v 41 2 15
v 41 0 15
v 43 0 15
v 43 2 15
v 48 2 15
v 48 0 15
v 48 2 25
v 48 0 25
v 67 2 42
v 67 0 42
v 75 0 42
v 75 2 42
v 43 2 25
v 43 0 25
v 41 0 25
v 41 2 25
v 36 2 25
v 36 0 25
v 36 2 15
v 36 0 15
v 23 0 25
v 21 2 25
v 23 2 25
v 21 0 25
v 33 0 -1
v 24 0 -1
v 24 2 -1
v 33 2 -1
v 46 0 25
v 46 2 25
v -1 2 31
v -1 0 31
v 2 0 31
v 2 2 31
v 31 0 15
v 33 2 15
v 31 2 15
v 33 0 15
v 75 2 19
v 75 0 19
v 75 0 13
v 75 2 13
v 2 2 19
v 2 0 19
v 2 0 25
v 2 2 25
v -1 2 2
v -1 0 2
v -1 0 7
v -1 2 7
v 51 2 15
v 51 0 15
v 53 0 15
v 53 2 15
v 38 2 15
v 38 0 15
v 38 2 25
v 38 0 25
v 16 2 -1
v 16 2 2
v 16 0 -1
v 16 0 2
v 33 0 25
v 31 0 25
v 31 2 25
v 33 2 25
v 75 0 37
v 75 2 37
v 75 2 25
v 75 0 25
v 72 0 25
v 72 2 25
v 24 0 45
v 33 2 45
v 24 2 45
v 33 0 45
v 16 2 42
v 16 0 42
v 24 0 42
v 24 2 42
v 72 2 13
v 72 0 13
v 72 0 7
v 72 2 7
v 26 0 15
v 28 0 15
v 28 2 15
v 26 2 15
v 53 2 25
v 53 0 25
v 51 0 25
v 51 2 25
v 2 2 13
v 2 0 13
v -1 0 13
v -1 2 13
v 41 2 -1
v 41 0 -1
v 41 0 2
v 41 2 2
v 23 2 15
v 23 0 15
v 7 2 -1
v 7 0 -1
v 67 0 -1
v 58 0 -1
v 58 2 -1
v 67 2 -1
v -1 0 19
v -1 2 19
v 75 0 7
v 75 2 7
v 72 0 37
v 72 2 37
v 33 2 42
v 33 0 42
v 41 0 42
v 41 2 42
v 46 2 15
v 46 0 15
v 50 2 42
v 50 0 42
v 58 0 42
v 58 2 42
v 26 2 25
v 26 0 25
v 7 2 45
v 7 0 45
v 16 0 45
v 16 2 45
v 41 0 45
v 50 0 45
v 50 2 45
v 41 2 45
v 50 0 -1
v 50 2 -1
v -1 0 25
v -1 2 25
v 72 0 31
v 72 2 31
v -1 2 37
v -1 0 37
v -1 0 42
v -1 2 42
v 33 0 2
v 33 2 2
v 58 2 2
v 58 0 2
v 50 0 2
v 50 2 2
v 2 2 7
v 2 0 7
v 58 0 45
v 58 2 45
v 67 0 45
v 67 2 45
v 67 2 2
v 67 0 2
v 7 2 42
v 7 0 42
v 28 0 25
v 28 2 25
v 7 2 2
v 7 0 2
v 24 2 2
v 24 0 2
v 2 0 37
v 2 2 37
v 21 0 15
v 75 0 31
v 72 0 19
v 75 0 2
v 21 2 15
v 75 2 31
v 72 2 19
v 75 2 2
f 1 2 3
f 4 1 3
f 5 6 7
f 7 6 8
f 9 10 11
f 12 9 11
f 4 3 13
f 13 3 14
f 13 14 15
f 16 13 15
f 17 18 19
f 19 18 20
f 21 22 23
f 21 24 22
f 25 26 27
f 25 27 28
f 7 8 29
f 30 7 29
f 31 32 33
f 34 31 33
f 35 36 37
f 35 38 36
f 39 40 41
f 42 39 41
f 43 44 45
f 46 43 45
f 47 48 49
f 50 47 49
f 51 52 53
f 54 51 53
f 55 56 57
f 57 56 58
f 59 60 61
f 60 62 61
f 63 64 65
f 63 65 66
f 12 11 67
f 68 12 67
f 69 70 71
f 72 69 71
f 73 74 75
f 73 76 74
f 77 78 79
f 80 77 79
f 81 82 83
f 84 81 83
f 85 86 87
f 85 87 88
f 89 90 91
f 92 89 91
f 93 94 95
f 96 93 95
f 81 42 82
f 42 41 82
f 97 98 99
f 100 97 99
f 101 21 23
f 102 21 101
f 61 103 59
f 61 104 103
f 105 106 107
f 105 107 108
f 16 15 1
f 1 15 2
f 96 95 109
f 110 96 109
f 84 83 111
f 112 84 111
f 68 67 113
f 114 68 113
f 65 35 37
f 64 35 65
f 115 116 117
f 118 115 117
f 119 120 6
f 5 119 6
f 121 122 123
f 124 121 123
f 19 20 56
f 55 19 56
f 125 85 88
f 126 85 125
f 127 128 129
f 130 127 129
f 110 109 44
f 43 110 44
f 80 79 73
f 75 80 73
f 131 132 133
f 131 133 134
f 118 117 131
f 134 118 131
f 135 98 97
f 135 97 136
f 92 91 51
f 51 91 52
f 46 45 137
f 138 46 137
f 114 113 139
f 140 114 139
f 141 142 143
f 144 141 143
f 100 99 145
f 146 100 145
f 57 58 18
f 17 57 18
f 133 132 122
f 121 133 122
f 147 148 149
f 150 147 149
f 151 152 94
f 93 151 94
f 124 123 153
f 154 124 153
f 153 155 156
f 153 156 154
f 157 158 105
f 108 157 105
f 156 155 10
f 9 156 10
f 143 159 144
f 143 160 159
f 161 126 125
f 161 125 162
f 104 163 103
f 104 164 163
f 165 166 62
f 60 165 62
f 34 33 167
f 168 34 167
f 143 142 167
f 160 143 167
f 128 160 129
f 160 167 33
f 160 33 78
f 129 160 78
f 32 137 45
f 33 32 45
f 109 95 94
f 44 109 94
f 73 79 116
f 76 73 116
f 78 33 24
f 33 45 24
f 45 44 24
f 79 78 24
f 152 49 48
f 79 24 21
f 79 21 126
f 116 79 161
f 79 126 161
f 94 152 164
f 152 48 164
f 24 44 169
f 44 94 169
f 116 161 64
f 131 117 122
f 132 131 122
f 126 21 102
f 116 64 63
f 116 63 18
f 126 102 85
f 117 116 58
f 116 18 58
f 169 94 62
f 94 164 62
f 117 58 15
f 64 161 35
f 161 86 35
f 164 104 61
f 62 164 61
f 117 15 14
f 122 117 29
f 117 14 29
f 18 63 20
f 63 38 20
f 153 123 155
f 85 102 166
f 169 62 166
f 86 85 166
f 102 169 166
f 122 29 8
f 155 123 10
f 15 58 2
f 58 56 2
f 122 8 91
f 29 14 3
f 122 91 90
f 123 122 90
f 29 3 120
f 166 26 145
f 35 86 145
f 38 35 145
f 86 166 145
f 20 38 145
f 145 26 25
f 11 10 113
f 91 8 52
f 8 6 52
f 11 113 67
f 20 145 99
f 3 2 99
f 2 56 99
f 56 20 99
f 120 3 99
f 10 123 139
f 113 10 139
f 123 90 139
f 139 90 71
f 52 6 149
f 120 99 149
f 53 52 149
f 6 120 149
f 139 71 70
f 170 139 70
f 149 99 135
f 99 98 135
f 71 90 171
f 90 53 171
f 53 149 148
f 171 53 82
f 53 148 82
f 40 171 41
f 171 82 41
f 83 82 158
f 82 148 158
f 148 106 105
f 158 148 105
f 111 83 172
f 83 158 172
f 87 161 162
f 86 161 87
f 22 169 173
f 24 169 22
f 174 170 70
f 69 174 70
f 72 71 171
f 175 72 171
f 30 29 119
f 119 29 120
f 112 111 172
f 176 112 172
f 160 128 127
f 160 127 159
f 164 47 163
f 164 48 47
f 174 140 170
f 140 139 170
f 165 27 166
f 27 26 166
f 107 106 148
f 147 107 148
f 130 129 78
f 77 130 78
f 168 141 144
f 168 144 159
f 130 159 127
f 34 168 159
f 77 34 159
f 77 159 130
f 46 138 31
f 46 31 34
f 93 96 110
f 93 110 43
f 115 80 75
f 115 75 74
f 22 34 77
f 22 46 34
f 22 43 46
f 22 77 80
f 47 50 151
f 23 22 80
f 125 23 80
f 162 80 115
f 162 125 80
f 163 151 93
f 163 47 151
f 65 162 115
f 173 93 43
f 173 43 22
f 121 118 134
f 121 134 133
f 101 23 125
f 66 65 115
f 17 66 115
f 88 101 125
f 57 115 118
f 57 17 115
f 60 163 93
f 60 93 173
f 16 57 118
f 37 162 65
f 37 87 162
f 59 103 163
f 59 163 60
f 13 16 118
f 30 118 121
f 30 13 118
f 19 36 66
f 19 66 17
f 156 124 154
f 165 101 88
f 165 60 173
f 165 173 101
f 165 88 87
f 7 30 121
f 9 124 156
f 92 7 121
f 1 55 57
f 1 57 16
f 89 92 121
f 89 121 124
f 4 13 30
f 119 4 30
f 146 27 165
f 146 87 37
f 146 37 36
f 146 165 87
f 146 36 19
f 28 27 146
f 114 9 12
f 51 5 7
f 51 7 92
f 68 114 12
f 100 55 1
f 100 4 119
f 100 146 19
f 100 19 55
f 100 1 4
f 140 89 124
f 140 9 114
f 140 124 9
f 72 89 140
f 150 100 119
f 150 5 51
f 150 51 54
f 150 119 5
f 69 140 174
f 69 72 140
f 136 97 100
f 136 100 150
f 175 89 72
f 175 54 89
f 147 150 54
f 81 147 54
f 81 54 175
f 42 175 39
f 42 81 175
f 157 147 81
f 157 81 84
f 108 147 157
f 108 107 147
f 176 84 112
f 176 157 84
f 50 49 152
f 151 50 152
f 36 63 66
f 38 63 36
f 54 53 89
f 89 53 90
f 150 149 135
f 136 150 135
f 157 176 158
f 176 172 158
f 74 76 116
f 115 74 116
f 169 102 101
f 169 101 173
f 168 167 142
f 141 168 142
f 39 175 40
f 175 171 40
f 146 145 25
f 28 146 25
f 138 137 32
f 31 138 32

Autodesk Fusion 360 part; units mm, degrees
sketch "スケッチ1" plane through (0, 0, 0) normal (0, 1, 0) x (1, 0, 0)
  line L0 (0, 0) -> (74, 0)
  line L1 (74, 0) -> (74, -44)
  line L2 (74, -44) -> (0, -44)
  line L3 (0, -44) -> (0, 0)
  dimension "d1" = 74
  dimension "d2" = 44
extrude "押し出し1" add sketch "スケッチ1" along normal blind 2
sketch "スケッチ2" plane through (0, 0, 0) normal (0, -1, 0) x (1, 0, 0)
  line L0 (74, 44) -> (0, 44)
  line L1 (0, 44) -> (0, 0)
  line L2 (0, 0) -> (74, 0)
  line L3 (74, 0) -> (74, 44)
  line L4 (0, 44) -> (7, 44)
  line L5 (7, 44) -> (7, 42)
  line L6 (7, 42) -> (0, 42)
  line L7 (0, 42) -> (0, 44)
  line L8 (16, 42) -> (24, 42)
  line L9 (24, 42) -> (24, 44)
  line L10 (24, 44) -> (16, 44)
  line L11 (16, 44) -> (16, 42)
  line L12 (41, 44) -> (33, 44)
  line L13 (33, 42) -> (41, 42)
  line L14 (41, 42) -> (41, 44)
  line L15 (33, 44) -> (33, 42)
  line L16 (58, 44) -> (50, 44)
  line L17 (50, 42) -> (58, 42)
  line L18 (58, 42) -> (58, 44)
  line L19 (50, 44) -> (50, 42)
  line L20 (67, 42) -> (74, 42)
  line L21 (74, 42) -> (74, 44)
  line L22 (74, 44) -> (67, 44)
  line L23 (67, 44) -> (67, 42)
  line L24 (50, 2) -> (50, 0)
  line L25 (67, 2) -> (67, 0)
  line L26 (16, 0) -> (24, 0)
  line L27 (50, 0) -> (58, 0)
  line L28 (0, 2) -> (7, 2)
  line L29 (67, 0) -> (74, 0)
  line L30 (58, 0) -> (58, 2)
  line L31 (24, 2) -> (16, 2)
  line L32 (33, 2) -> (33, 0)
  line L33 (58, 2) -> (50, 2)
  line L34 (33, 0) -> (41, 0)
  line L35 (0, 0) -> (0, 2)
  line L36 (24, 0) -> (24, 2)
  line L37 (74, 2) -> (67, 2)
  line L38 (7, 2) -> (7, 0)
  line L39 (41, 0) -> (41, 2)
  line L40 (16, 2) -> (16, 0)
  line L41 (74, 0) -> (74, 2)
  line L42 (7, 0) -> (0, 0)
  line L43 (41, 2) -> (33, 2)
  dimension "d5" = 7
  dimension "d6" = 2
  dimension "d7" = 2
  dimension "d8" = 8
  dimension "d9" = 9
  dimension "d12" = 17
  dimension "d13" = 0
  dimension "d14" = 7
  dimension "d15" = 2
  dimension "d16" = 9
extrude "押し出し2" cut sketch "スケッチ2" against normal blind 2 contours L0 L3 L20 L21 L22 L23 | L0 L16 L17 L18 L19 | L2 L3 L25 L29 L37 L41 | L0 L12 L13 L14 L15 | L2 L24 L27 L30 L33 | L0 L8 L9 L10 L11 | L2 L32 L34 L39 L43 | L0 L1 L4 L5 L6 L7 | L2 L26 L31 L36 L40 | L1 L2 L28 L35 L38 L42
sketch "スケッチ3" plane through (0, 0, 0) normal (0, -1, 0) x (1, 0, 0)
  line L0 (33, 42) -> (33, 44)
  line L1 (33, 44) -> (24, 44)
  line L2 (24, 44) -> (24, 42)
  line L3 (24, 42) -> (16, 42)
  line L4 (16, 42) -> (16, 44)
  line L5 (16, 44) -> (7, 44)
  line L6 (7, 44) -> (7, 42)
  line L7 (7, 42) -> (0, 42)
  line L8 (0, 42) -> (0, 2)
  line L9 (0, 2) -> (7, 2)
  line L10 (7, 2) -> (7, 0)
  line L11 (7, 0) -> (16, 0)
  line L12 (16, 0) -> (16, 2)
  line L13 (16, 2) -> (24, 2)
  line L14 (24, 2) -> (24, 0)
  line L15 (24, 0) -> (33, 0)
  line L16 (33, 0) -> (33, 2)
  line L17 (33, 2) -> (41, 2)
  line L18 (41, 2) -> (41, 0)
  line L19 (41, 0) -> (50, 0)
  line L20 (50, 0) -> (50, 2)
  line L21 (50, 2) -> (58, 2)
  line L22 (58, 2) -> (58, 0)
  line L23 (58, 0) -> (67, 0)
  line L24 (67, 0) -> (67, 2)
  line L25 (67, 2) -> (74, 2)
  line L26 (74, 2) -> (74, 42)
  line L27 (74, 42) -> (67, 42)
  line L28 (67, 42) -> (67, 44)
  line L29 (67, 44) -> (58, 44)
  line L30 (58, 44) -> (58, 42)
  line L31 (58, 42) -> (50, 42)
  line L32 (50, 42) -> (50, 44)
  line L33 (50, 44) -> (41, 44)
  line L34 (41, 44) -> (41, 42)
  line L35 (41, 42) -> (33, 42)
  line L36 (2, 37) -> (0, 37)
  line L37 (0, 37) -> (0, 31)
  line L38 (0, 31) -> (2, 31)
  line L39 (2, 31) -> (2, 37)
  line L40 (0, 19) -> (2, 19)
  line L41 (0, 25) -> (0, 19)
  line L42 (2, 25) -> (0, 25)
  line L43 (2, 19) -> (2, 25)
  line L44 (0, 7) -> (2, 7)
  line L45 (0, 13) -> (0, 7)
  line L46 (2, 13) -> (0, 13)
  line L47 (2, 7) -> (2, 13)
  line L48 (72, 31) -> (74, 31)
  line L49 (74, 37) -> (72, 37)
  line L50 (74, 25) -> (72, 25)
  line L51 (72, 37) -> (72, 31)
  line L52 (72, 19) -> (74, 19)
  line L53 (72, 7) -> (74, 7)
  line L54 (74, 19) -> (74, 25)
  line L55 (72, 25) -> (72, 19)
  line L56 (74, 7) -> (74, 13)
  line L57 (74, 31) -> (74, 37)
  line L58 (72, 13) -> (72, 7)
  line L59 (74, 13) -> (72, 13)
  dimension "d23" = 7
  dimension "d24" = 6
  dimension "d25" = 2
  dimension "d28" = 0
  dimension "d29" = -12
  dimension "d30" = 7
  dimension "d33" = 72
  dimension "d34" = 0
extrude "押し出し3" cut sketch "スケッチ3" against normal blind 2 contours L8 L36 L37 L38 L39 | L26 L48 L49 L51 L57 | L8 L40 L41 L42 L43 | L26 L50 L52 L54 L55 | L8 L44 L45 L46 L47 | L26 L53 L56 L58 L59
sketch "スケッチ4" plane through (0, 0, 0) normal (0, -1, 0) x (1, 0, 0)
  line L0 (2, 31) -> (0, 31)
  line L1 (0, 31) -> (0, 25)
  line L2 (0, 25) -> (2, 25)
  line L3 (2, 25) -> (2, 19)
  line L4 (2, 19) -> (0, 19)
  line L5 (0, 19) -> (0, 13)
  line L6 (0, 13) -> (2, 13)
  line L7 (2, 13) -> (2, 7)
  line L8 (2, 7) -> (0, 7)
  line L9 (0, 7) -> (0, 2)
  line L10 (0, 2) -> (7, 2)
  line L11 (7, 2) -> (7, 0)
  line L12 (7, 0) -> (16, 0)
  line L13 (16, 0) -> (16, 2)
  line L14 (16, 2) -> (24, 2)
  line L15 (24, 2) -> (24, 0)
  line L16 (24, 0) -> (33, 0)
  line L17 (33, 0) -> (33, 2)
  line L18 (33, 2) -> (41, 2)
  line L19 (41, 2) -> (41, 0)
  line L20 (41, 0) -> (50, 0)
  line L21 (50, 0) -> (50, 2)
  line L22 (50, 2) -> (58, 2)
  line L23 (58, 2) -> (58, 0)
  line L24 (58, 0) -> (67, 0)
  line L25 (67, 0) -> (67, 2)
  line L26 (67, 2) -> (74, 2)
  line L27 (74, 2) -> (74, 7)
  line L28 (74, 7) -> (72, 7)
  line L29 (72, 7) -> (72, 13)
  line L30 (72, 13) -> (74, 13)
  line L31 (74, 13) -> (74, 19)
  line L32 (74, 19) -> (72, 19)
  line L33 (72, 19) -> (72, 25)
  line L34 (72, 25) -> (74, 25)
  line L35 (74, 25) -> (74, 31)
  line L36 (74, 31) -> (72, 31)
  line L37 (72, 31) -> (72, 37)
  line L38 (72, 37) -> (74, 37)
  line L39 (74, 37) -> (74, 42)
  line L40 (74, 42) -> (67, 42)
  line L41 (67, 42) -> (67, 44)
  line L42 (67, 44) -> (58, 44)
  line L43 (58, 44) -> (58, 42)
  line L44 (58, 42) -> (50, 42)
  line L45 (50, 42) -> (50, 44)
  line L46 (50, 44) -> (41, 44)
  line L47 (41, 44) -> (41, 42)
  line L48 (41, 42) -> (33, 42)
  line L49 (33, 42) -> (33, 44)
  line L50 (33, 44) -> (24, 44)
  line L51 (24, 44) -> (24, 42)
  line L52 (24, 42) -> (16, 42)
  line L53 (16, 42) -> (16, 44)
  line L54 (16, 44) -> (7, 44)
  line L55 (7, 44) -> (7, 42)
  line L56 (7, 42) -> (0, 42)
  line L57 (0, 42) -> (0, 37)
  line L58 (0, 37) -> (2, 37)
  line L59 (2, 37) -> (2, 31)
  line L60 (36, 15) -> (38, 15)
  line L61 (38, 15) -> (38, 25)
  line L62 (38, 25) -> (36, 25)
  line L63 (36, 25) -> (36, 15)
  line L64 (33, 15) -> (31, 15)
  line L65 (31, 15) -> (31, 25)
  line L66 (31, 25) -> (33, 25)
  line L67 (33, 25) -> (33, 15)
  line L68 (28, 15) -> (26, 15)
  line L69 (26, 15) -> (26, 25)
  line L70 (26, 25) -> (28, 25)
  line L71 (28, 25) -> (28, 15)
  line L72 (41, 15) -> (43, 15)
  line L73 (43, 15) -> (43, 25)
  line L74 (43, 25) -> (41, 25)
  line L75 (41, 25) -> (41, 15)
  line L76 (46, 15) -> (48, 15)
  line L77 (48, 15) -> (48, 25)
  line L78 (48, 25) -> (46, 25)
  line L79 (46, 25) -> (46, 15)
  line L80 (23, 15) -> (21, 15)
  line L81 (21, 15) -> (21, 25)
  line L82 (21, 25) -> (23, 25)
  line L83 (23, 25) -> (23, 15)
  line L84 (51, 15) -> (53, 15)
  line L85 (53, 15) -> (53, 25)
  line L86 (53, 25) -> (51, 25)
  line L87 (51, 25) -> (51, 15)
extrude "押し出し4" cut sketch "スケッチ4" against normal blind 2 contours L60 L61 L62 L63 | L64 L65 L66 L67 | L68 L69 L70 L71 | L72 L73 L74 L75 | L76 L77 L78 L79 | L80 L81 L82 L83 | L84 L85 L86 L87
sketch "スケッチ5" plane through (0, 0, 0) normal (0, -1, 0) x (1, 0, 0)
  line L0 (31, 15) -> (31, 25)
  line L1 (31, 25) -> (33, 25)
  line L2 (33, 25) -> (33, 15)
  line L3 (33, 15) -> (31, 15)
  line L4 (38, 15) -> (36, 15)
  line L5 (36, 15) -> (36, 25)
  line L6 (36, 25) -> (38, 25)
  line L7 (38, 25) -> (38, 15)
  line L8 (26, 15) -> (26, 25)
  line L9 (26, 25) -> (28, 25)
  line L10 (28, 25) -> (28, 15)
  line L11 (28, 15) -> (26, 15)
  line L12 (21, 15) -> (21, 25)
  line L13 (21, 25) -> (23, 25)
  line L14 (23, 25) -> (23, 15)
  line L15 (23, 15) -> (21, 15)
  line L16 (48, 15) -> (46, 15)
  line L17 (46, 15) -> (46, 25)
  line L18 (46, 25) -> (48, 25)
  line L19 (48, 25) -> (48, 15)
  line L20 (43, 15) -> (41, 15)
  line L21 (41, 15) -> (41, 25)
  line L22 (41, 25) -> (43, 25)
  line L23 (43, 25) -> (43, 15)
  line L24 (53, 15) -> (51, 15)
  line L25 (51, 15) -> (51, 25)
  line L26 (51, 25) -> (53, 25)
  line L27 (53, 25) -> (53, 15)
  line L28 (2, 31) -> (0, 31)
  line L29 (0, 31) -> (0, 25)
  line L30 (0, 25) -> (2, 25)
  line L31 (2, 25) -> (2, 19)
  line L32 (2, 19) -> (0, 19)
  line L33 (0, 19) -> (0, 13)
  line L34 (0, 13) -> (2, 13)
  line L35 (2, 13) -> (2, 7)
  line L36 (2, 7) -> (0, 7)
  line L37 (0, 7) -> (0, 2)
  line L38 (0, 2) -> (7, 2)
  line L39 (7, 2) -> (7, 0)
  line L40 (7, 0) -> (16, 0)
  line L41 (16, 0) -> (16, 2)
  line L42 (16, 2) -> (24, 2)
  line L43 (24, 2) -> (24, 0)
  line L44 (24, 0) -> (33, 0)
  line L45 (33, 0) -> (33, 2)
  line L46 (33, 2) -> (41, 2)
  line L47 (41, 2) -> (41, 0)
  line L48 (41, 0) -> (50, 0)
  line L49 (50, 0) -> (50, 2)
  line L50 (50, 2) -> (58, 2)
  line L51 (58, 2) -> (58, 0)
  line L52 (58, 0) -> (67, 0)
  line L53 (67, 0) -> (67, 2)
  line L54 (67, 2) -> (74, 2)
  line L55 (74, 2) -> (74, 7)
  line L56 (74, 7) -> (72, 7)
  line L57 (72, 7) -> (72, 13)
  line L58 (72, 13) -> (74, 13)
  line L59 (74, 13) -> (74, 19)
  line L60 (74, 19) -> (72, 19)
  line L61 (72, 19) -> (72, 25)
  line L62 (72, 25) -> (74, 25)
  line L63 (74, 25) -> (74, 31)
  line L64 (74, 31) -> (72, 31)
  line L65 (72, 31) -> (72, 37)
  line L66 (72, 37) -> (74, 37)
  line L67 (74, 37) -> (74, 42)
  line L68 (74, 42) -> (67, 42)
  line L69 (67, 42) -> (67, 44)
  line L70 (67, 44) -> (58, 44)
  line L71 (58, 44) -> (58, 42)
  line L72 (58, 42) -> (50, 42)
  line L73 (50, 42) -> (50, 44)
  line L74 (50, 44) -> (41, 44)
  line L75 (41, 44) -> (41, 42)
  line L76 (41, 42) -> (33, 42)
  line L77 (33, 42) -> (33, 44)
  line L78 (33, 44) -> (24, 44)
  line L79 (24, 44) -> (24, 42)
  line L80 (24, 42) -> (16, 42)
  line L81 (16, 42) -> (16, 44)
  line L82 (16, 44) -> (7, 44)
  line L83 (7, 44) -> (7, 42)
  line L84 (7, 42) -> (0, 42)
  line L85 (0, 42) -> (0, 37)
  line L86 (0, 37) -> (2, 37)
  line L87 (2, 37) -> (2, 31)
  line L88 (7, 45) -> (16, 45)
  line L89 (16, 45) -> (16, 44)
  line L90 (16, 44) -> (7, 44)
  line L91 (7, 44) -> (7, 45)
  line L92 (24, 44) -> (33, 44)
  line L93 (33, 44) -> (33, 45)
  line L94 (33, 45) -> (24, 45)
  line L95 (24, 45) -> (24, 44)
  line L96 (41, 44) -> (50, 44)
  line L97 (50, 44) -> (50, 45)
  line L98 (50, 45) -> (41, 45)
  line L99 (41, 45) -> (41, 44)
  line L100 (58, 44) -> (67, 44)
  line L101 (67, 44) -> (67, 45)
  line L102 (67, 45) -> (58, 45)
  line L103 (58, 45) -> (58, 44)
  line L104 (74, 42) -> (75, 42)
  line L105 (75, 42) -> (75, 37)
  line L106 (75, 37) -> (74, 37)
  line L107 (74, 37) -> (74, 42)
  line L108 (74, 31) -> (75, 31)
  line L109 (75, 31) -> (75, 25)
  line L110 (75, 25) -> (74, 25)
  line L111 (74, 25) -> (74, 31)
  line L112 (74, 19) -> (75, 19)
  line L113 (75, 19) -> (75, 13)
  line L114 (75, 13) -> (74, 13)
  line L115 (74, 13) -> (74, 19)
  line L116 (74, 7) -> (75, 7)
  line L117 (75, 7) -> (75, 2)
  line L118 (75, 2) -> (74, 2)
  line L119 (74, 2) -> (74, 7)
  line L120 (67, 0) -> (58, 0)
  line L121 (58, 0) -> (58, -1)
  line L122 (58, -1) -> (67, -1)
  line L123 (67, -1) -> (67, 0)
  line L124 (50, 0) -> (41, 0)
  line L125 (41, 0) -> (41, -1)
  line L126 (41, -1) -> (50, -1)
  line L127 (50, -1) -> (50, 0)
  line L128 (33, 0) -> (24, 0)
  line L129 (24, 0) -> (24, -1)
  line L130 (24, -1) -> (33, -1)
  line L131 (33, -1) -> (33, 0)
  line L132 (16, 0) -> (7, 0)
  line L133 (7, 0) -> (7, -1)
  line L134 (7, -1) -> (16, -1)
  line L135 (16, -1) -> (16, 0)
  line L136 (0, 2) -> (-1, 2)
  line L137 (-1, 2) -> (-1, 7)
  line L138 (-1, 7) -> (0, 7)
  line L139 (0, 7) -> (0, 2)
  line L140 (0, 13) -> (-1, 13)
  line L141 (-1, 13) -> (-1, 19)
  line L142 (-1, 19) -> (0, 19)
  line L143 (0, 19) -> (0, 13)
  line L144 (0, 25) -> (-1, 25)
  line L145 (-1, 25) -> (-1, 31)
  line L146 (-1, 31) -> (0, 31)
  line L147 (0, 31) -> (0, 25)
  line L148 (0, 37) -> (-1, 37)
  line L149 (-1, 37) -> (-1, 42)
  line L150 (-1, 42) -> (0, 42)
  line L151 (0, 42) -> (0, 37)
extrude "押し出し5" add sketch "スケッチ5" against normal blind 2 contours L29 L144 L145 L146 L147 | L85 L148 L149 L150 L151 | L33 L140 L141 L142 L143 | L82 L88 L89 L90 L91 | L37 L136 L137 L138 L139 | L78 L92 L93 L94 L95 | L40 L132 L133 L134 L135 | L74 L96 L97 L98 L99 | L44 L128 L129 L130 L131 | L70 L100 L101 L102 L103 | L48 L124 L125 L126 L127 | L67 L104 L105 L106 L107 | L52 L120 L121 L122 L123 | L63 L108 L109 L110 L111 | L55 L116 L117 L118 L119 | L59 L112 L113 L114 L115
sketch "スケッチ6" plane through (0, 0, 0) normal (0, -1, 0) x (1, 0, 0)
  line L0 (31, 15) -> (31, 25)
  line L1 (31, 25) -> (33, 25)
  line L2 (33, 25) -> (33, 15)
  line L3 (33, 15) -> (31, 15)
  line L4 (38, 15) -> (36, 15)
  line L5 (36, 15) -> (36, 25)
  line L6 (36, 25) -> (38, 25)
  line L7 (38, 25) -> (38, 15)
  line L8 (26, 15) -> (26, 25)
  line L9 (26, 25) -> (28, 25)
  line L10 (28, 25) -> (28, 15)
  line L11 (28, 15) -> (26, 15)
  line L12 (21, 15) -> (21, 25)
  line L13 (21, 25) -> (23, 25)
  line L14 (23, 25) -> (23, 15)
  line L15 (23, 15) -> (21, 15)
  line L16 (48, 15) -> (46, 15)
  line L17 (46, 15) -> (46, 25)
  line L18 (46, 25) -> (48, 25)
  line L19 (48, 25) -> (48, 15)
  line L20 (43, 15) -> (41, 15)
  line L21 (41, 15) -> (41, 25)
  line L22 (41, 25) -> (43, 25)
  line L23 (43, 25) -> (43, 15)
  line L24 (53, 15) -> (51, 15)
  line L25 (51, 15) -> (51, 25)
  line L26 (51, 25) -> (53, 25)
  line L27 (53, 25) -> (53, 15)
  line L28 (2, 31) -> (-1, 31)
  line L29 (-1, 31) -> (-1, 25)
  line L30 (-1, 25) -> (2, 25)
  line L31 (2, 25) -> (2, 19)
  line L32 (2, 19) -> (-1, 19)
  line L33 (-1, 19) -> (-1, 13)
  line L34 (-1, 13) -> (2, 13)
  line L35 (2, 13) -> (2, 7)
  line L36 (2, 7) -> (-1, 7)
  line L37 (-1, 7) -> (-1, 2)
  line L38 (-1, 2) -> (7, 2)
  line L39 (7, 2) -> (7, -1)
  line L40 (7, -1) -> (16, -1)
  line L41 (16, -1) -> (16, 2)
  line L42 (16, 2) -> (24, 2)
  line L43 (24, 2) -> (24, -1)
  line L44 (24, -1) -> (33, -1)
  line L45 (33, -1) -> (33, 2)
  line L46 (33, 2) -> (41, 2)
  line L47 (41, 2) -> (41, -1)
  line L48 (41, -1) -> (50, -1)
  line L49 (50, -1) -> (50, 2)
  line L50 (50, 2) -> (58, 2)
  line L51 (58, 2) -> (58, -1)
  line L52 (58, -1) -> (67, -1)
  line L53 (67, -1) -> (67, 2)
  line L54 (67, 2) -> (75, 2)
  line L55 (75, 2) -> (75, 7)
  line L56 (75, 7) -> (72, 7)
  line L57 (72, 7) -> (72, 13)
  line L58 (72, 13) -> (75, 13)
  line L59 (75, 13) -> (75, 19)
  line L60 (75, 19) -> (72, 19)
  line L61 (72, 19) -> (72, 25)
  line L62 (72, 25) -> (75, 25)
  line L63 (75, 25) -> (75, 31)
  line L64 (75, 31) -> (72, 31)
  line L65 (72, 31) -> (72, 37)
  line L66 (72, 37) -> (75, 37)
  line L67 (75, 37) -> (75, 42)
  line L68 (75, 42) -> (67, 42)
  line L69 (67, 42) -> (67, 45)
  line L70 (67, 45) -> (58, 45)
  line L71 (58, 45) -> (58, 42)
  line L72 (58, 42) -> (50, 42)
  line L73 (50, 42) -> (50, 45)
  line L74 (50, 45) -> (41, 45)
  line L75 (41, 45) -> (41, 42)
  line L76 (41, 42) -> (33, 42)
  line L77 (33, 42) -> (33, 45)
  line L78 (33, 45) -> (24, 45)
  line L79 (24, 45) -> (24, 42)
  line L80 (24, 42) -> (16, 42)
  line L81 (16, 42) -> (16, 45)
  line L82 (16, 45) -> (7, 45)
  line L83 (7, 45) -> (7, 42)
  line L84 (7, 42) -> (-1, 42)
  line L85 (-1, 42) -> (-1, 37)
  line L86 (-1, 37) -> (2, 37)
  line L87 (2, 37) -> (2, 31)
